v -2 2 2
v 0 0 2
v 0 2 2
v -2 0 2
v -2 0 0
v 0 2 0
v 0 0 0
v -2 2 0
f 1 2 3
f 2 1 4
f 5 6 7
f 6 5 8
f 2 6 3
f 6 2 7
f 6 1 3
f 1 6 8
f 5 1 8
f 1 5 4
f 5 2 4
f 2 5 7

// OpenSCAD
// Matrix helpers used by real-world libraries.
function identity(n) = [for (i = [0:n - 1]) [for (j = [0:n - 1]) i == j ? 1 : 0]];
function transpose(m) = [for (j = [0:len(m[0]) - 1]) [for (i = [0:len(m) - 1]) m[i][j]]];
function rot_z(a) = [[cos(a), -sin(a), 0, 0], [sin(a), cos(a), 0, 0], [0, 0, 1, 0], [0, 0, 0, 1]];
m = rot_z(30) * rot_z(60);
echo(identity(3));
echo(transpose([[1, 2, 3], [4, 5, 6]]));
echo(m);
multmatrix(m) cube(2);
